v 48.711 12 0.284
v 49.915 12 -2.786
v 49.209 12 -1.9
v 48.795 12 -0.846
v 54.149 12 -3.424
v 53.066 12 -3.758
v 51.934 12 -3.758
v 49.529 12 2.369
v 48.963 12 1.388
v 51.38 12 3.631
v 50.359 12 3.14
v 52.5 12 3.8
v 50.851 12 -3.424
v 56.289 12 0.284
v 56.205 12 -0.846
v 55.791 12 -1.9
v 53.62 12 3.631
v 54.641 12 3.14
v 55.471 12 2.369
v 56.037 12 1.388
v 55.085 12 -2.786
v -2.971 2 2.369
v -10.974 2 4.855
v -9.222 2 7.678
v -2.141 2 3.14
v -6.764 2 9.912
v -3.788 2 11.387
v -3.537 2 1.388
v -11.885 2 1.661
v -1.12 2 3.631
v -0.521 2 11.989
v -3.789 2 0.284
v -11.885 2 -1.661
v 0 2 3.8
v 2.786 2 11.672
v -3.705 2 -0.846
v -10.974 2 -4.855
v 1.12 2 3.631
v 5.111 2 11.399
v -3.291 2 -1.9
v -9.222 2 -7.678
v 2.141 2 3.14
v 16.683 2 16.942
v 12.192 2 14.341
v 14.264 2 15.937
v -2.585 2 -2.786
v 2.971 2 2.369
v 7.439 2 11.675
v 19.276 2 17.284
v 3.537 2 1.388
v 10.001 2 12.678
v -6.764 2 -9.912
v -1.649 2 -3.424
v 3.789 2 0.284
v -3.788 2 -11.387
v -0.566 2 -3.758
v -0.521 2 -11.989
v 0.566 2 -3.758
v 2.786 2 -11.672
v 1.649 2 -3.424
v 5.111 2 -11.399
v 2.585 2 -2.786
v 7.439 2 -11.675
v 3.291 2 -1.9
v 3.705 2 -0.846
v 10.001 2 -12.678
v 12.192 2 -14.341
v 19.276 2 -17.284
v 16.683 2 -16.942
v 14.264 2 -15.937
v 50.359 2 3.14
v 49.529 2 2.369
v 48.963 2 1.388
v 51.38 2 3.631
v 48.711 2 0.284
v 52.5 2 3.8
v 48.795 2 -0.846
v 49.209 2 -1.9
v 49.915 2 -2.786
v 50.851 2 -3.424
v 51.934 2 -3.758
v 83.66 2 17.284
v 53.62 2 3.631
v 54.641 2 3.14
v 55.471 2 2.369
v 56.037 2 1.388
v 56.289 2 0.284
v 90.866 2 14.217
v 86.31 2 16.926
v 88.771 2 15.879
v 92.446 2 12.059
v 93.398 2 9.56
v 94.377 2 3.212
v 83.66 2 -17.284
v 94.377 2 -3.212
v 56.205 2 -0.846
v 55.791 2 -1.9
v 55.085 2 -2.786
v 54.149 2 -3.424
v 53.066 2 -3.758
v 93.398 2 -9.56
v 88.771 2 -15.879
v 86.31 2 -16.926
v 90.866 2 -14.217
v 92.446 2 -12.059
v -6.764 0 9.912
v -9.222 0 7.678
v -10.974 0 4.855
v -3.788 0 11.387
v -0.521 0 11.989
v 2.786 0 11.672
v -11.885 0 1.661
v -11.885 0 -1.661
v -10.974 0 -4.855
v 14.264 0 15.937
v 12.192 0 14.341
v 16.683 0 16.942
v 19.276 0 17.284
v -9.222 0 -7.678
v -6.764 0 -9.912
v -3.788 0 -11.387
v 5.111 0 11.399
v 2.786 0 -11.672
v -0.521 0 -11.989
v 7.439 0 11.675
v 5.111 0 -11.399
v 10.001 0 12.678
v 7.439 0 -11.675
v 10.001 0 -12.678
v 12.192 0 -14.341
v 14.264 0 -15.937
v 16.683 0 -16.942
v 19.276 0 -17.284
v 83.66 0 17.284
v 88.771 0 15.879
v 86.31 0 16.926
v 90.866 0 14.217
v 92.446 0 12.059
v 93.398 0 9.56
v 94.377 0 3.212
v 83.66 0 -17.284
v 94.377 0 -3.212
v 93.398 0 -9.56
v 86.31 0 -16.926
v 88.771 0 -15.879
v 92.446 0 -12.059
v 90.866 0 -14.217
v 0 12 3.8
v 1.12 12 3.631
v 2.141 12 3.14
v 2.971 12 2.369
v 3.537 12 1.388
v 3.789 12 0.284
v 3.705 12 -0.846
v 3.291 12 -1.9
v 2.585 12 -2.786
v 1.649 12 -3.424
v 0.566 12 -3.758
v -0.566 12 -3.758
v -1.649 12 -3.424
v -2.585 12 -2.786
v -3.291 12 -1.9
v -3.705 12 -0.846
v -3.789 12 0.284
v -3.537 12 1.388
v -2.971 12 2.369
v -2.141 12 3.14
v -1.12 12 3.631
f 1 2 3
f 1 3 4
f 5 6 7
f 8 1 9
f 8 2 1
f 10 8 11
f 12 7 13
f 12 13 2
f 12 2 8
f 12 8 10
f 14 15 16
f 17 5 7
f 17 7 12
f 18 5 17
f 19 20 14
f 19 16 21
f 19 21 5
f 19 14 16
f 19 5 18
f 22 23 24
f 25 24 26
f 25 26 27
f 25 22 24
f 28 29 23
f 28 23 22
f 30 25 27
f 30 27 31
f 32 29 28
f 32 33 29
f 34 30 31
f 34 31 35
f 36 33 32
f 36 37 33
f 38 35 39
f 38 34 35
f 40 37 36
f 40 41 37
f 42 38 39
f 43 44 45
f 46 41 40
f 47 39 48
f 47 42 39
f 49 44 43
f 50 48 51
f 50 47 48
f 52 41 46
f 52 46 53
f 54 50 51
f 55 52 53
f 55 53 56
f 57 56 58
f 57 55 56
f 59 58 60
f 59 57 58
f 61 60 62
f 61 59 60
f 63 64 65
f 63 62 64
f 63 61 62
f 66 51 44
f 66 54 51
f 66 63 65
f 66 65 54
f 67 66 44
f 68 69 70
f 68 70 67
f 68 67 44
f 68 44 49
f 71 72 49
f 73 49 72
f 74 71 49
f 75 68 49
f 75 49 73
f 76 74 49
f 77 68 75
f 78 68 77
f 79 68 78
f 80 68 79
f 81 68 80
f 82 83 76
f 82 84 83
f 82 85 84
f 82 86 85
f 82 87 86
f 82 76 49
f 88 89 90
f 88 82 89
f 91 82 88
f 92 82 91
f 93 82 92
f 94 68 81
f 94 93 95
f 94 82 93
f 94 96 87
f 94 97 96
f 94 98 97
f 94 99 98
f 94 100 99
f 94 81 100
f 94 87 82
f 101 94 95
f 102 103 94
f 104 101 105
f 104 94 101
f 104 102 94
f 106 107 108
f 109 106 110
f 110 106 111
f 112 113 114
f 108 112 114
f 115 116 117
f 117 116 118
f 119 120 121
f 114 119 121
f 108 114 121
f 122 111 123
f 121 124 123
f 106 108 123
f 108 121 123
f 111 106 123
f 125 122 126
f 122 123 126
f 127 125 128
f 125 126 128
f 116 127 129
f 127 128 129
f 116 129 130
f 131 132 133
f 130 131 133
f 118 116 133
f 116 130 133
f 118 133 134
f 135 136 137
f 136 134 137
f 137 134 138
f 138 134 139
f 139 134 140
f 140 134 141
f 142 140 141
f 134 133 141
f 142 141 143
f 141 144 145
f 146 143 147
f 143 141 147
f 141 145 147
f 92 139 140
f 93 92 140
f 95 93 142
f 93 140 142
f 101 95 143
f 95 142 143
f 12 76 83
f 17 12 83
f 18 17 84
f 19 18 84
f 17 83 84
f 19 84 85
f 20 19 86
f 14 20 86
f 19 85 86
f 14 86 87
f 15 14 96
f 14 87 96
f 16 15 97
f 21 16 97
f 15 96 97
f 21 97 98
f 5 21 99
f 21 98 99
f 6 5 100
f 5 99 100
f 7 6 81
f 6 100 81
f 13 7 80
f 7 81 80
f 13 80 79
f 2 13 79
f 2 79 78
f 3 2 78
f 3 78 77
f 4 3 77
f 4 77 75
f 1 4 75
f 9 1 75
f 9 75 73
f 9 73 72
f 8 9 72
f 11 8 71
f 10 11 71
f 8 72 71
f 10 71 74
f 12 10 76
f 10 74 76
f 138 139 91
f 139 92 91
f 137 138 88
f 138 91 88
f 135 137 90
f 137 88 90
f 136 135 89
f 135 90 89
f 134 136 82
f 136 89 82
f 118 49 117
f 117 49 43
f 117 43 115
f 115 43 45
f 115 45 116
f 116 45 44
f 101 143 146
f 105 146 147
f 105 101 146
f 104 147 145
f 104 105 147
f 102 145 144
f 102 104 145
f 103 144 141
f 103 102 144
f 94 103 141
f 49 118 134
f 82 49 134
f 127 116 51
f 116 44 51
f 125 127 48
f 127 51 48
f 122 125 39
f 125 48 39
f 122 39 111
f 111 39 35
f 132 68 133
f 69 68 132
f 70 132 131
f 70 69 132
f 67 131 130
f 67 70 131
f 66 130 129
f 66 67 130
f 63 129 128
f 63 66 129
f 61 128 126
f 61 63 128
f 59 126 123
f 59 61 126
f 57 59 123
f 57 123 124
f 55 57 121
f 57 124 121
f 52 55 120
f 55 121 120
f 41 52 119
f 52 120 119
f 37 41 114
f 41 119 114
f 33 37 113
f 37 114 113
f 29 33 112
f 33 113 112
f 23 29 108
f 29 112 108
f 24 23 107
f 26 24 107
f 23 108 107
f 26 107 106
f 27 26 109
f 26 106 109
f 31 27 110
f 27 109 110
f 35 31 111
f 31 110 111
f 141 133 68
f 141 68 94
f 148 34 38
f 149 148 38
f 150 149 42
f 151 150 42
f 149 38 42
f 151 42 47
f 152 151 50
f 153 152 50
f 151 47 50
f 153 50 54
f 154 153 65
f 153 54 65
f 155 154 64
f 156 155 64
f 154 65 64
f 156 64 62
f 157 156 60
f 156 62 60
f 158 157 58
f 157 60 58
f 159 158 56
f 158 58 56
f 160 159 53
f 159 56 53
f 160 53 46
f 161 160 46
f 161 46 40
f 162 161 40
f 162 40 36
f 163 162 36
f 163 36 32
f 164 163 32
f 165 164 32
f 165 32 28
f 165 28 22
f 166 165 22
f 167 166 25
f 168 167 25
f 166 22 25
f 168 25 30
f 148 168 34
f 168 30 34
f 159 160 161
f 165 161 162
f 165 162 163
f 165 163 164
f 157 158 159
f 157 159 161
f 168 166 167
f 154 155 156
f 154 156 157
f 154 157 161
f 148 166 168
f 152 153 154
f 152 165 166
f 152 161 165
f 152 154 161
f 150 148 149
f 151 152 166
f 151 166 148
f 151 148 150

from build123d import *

# Parameters (mm, degrees)
SKETCH1_R           = 12
SKETCH1_R_2         = 42
BOSS_EXTRUDE1_DEPTH = 2
SKETCH2_R           = 3.8
BOSS_EXTRUDE2_DEPTH = 10
FILLET1_R           = 10
CUT_EXTRUDE1_START  = -10
CUT_EXTRUDE1_DEPTH  = 10
FILLET2_R           = 10


with BuildPart() as part:
    # Sketch1 → Boss-Extrude1 (new body)
    with BuildSketch(Plane(origin=(0, 0, 0), x_dir=(1, 0, 0), z_dir=(0, 1, 0))):
        Circle(SKETCH1_R)
        with Locations((52.5, 0)):
            Circle(SKETCH1_R_2)
    extrude(amount=BOSS_EXTRUDE1_DEPTH)

    # Sketch2 → Boss-Extrude2 (add)
    with BuildSketch(Plane(origin=(0, 2, 0), x_dir=(1, 0, 0), z_dir=(0, 1, 0))):
        with Locations(Location((0, 0, 0), (0, 0, 270))):
            Circle(SKETCH2_R)
        with Locations(Location((52.5, 0, 0), (0, 0, 270))):
            Circle(SKETCH2_R)
    extrude(amount=BOSS_EXTRUDE2_DEPTH)

    # Fillet1
    fillet1_edges = [part.edges().sort_by_distance(p)[0] for p in [
        (10.821428571, 1, 5.186201276),
        (10.821428571, 1, -5.186201276),
    ]]
    fillet(fillet1_edges, radius=FILLET1_R)

    # Sketch3 → Cut-Extrude1 (cut)
    with BuildSketch(Plane(origin=(0, 2, 0), x_dir=(1, 0, 0), z_dir=(0, 1, 0)).offset(CUT_EXTRUDE1_START)):
        with BuildLine():
            Line((14.221153846, -17.283805632), (90.778846154, -17.283805632))
            ThreePointArc((90.778846154, -17.283805632), (52.5, -42), (14.221153846, -17.283805632))
        make_face()
        with BuildLine():
            Line((14.221153846, 17.283805632), (90.778846154, 17.283805632))
            ThreePointArc((90.778846154, 17.283805632), (52.5, 42), (14.221153846, 17.283805632))
        make_face()
    extrude(amount=CUT_EXTRUDE1_DEPTH, mode=Mode.SUBTRACT)

    # Fillet2
    fillet2_edges = [part.edges().sort_by_distance(p)[0] for p in [
        (14.221153846, 1, 17.283805632),
        (14.221153846, 1, -17.283805632),
        (90.778846154, 1, 17.283805632),
        (90.778846154, 1, -17.283805632),
    ]]
    fillet(fillet2_edges, radius=FILLET2_R)


solid = part.part
